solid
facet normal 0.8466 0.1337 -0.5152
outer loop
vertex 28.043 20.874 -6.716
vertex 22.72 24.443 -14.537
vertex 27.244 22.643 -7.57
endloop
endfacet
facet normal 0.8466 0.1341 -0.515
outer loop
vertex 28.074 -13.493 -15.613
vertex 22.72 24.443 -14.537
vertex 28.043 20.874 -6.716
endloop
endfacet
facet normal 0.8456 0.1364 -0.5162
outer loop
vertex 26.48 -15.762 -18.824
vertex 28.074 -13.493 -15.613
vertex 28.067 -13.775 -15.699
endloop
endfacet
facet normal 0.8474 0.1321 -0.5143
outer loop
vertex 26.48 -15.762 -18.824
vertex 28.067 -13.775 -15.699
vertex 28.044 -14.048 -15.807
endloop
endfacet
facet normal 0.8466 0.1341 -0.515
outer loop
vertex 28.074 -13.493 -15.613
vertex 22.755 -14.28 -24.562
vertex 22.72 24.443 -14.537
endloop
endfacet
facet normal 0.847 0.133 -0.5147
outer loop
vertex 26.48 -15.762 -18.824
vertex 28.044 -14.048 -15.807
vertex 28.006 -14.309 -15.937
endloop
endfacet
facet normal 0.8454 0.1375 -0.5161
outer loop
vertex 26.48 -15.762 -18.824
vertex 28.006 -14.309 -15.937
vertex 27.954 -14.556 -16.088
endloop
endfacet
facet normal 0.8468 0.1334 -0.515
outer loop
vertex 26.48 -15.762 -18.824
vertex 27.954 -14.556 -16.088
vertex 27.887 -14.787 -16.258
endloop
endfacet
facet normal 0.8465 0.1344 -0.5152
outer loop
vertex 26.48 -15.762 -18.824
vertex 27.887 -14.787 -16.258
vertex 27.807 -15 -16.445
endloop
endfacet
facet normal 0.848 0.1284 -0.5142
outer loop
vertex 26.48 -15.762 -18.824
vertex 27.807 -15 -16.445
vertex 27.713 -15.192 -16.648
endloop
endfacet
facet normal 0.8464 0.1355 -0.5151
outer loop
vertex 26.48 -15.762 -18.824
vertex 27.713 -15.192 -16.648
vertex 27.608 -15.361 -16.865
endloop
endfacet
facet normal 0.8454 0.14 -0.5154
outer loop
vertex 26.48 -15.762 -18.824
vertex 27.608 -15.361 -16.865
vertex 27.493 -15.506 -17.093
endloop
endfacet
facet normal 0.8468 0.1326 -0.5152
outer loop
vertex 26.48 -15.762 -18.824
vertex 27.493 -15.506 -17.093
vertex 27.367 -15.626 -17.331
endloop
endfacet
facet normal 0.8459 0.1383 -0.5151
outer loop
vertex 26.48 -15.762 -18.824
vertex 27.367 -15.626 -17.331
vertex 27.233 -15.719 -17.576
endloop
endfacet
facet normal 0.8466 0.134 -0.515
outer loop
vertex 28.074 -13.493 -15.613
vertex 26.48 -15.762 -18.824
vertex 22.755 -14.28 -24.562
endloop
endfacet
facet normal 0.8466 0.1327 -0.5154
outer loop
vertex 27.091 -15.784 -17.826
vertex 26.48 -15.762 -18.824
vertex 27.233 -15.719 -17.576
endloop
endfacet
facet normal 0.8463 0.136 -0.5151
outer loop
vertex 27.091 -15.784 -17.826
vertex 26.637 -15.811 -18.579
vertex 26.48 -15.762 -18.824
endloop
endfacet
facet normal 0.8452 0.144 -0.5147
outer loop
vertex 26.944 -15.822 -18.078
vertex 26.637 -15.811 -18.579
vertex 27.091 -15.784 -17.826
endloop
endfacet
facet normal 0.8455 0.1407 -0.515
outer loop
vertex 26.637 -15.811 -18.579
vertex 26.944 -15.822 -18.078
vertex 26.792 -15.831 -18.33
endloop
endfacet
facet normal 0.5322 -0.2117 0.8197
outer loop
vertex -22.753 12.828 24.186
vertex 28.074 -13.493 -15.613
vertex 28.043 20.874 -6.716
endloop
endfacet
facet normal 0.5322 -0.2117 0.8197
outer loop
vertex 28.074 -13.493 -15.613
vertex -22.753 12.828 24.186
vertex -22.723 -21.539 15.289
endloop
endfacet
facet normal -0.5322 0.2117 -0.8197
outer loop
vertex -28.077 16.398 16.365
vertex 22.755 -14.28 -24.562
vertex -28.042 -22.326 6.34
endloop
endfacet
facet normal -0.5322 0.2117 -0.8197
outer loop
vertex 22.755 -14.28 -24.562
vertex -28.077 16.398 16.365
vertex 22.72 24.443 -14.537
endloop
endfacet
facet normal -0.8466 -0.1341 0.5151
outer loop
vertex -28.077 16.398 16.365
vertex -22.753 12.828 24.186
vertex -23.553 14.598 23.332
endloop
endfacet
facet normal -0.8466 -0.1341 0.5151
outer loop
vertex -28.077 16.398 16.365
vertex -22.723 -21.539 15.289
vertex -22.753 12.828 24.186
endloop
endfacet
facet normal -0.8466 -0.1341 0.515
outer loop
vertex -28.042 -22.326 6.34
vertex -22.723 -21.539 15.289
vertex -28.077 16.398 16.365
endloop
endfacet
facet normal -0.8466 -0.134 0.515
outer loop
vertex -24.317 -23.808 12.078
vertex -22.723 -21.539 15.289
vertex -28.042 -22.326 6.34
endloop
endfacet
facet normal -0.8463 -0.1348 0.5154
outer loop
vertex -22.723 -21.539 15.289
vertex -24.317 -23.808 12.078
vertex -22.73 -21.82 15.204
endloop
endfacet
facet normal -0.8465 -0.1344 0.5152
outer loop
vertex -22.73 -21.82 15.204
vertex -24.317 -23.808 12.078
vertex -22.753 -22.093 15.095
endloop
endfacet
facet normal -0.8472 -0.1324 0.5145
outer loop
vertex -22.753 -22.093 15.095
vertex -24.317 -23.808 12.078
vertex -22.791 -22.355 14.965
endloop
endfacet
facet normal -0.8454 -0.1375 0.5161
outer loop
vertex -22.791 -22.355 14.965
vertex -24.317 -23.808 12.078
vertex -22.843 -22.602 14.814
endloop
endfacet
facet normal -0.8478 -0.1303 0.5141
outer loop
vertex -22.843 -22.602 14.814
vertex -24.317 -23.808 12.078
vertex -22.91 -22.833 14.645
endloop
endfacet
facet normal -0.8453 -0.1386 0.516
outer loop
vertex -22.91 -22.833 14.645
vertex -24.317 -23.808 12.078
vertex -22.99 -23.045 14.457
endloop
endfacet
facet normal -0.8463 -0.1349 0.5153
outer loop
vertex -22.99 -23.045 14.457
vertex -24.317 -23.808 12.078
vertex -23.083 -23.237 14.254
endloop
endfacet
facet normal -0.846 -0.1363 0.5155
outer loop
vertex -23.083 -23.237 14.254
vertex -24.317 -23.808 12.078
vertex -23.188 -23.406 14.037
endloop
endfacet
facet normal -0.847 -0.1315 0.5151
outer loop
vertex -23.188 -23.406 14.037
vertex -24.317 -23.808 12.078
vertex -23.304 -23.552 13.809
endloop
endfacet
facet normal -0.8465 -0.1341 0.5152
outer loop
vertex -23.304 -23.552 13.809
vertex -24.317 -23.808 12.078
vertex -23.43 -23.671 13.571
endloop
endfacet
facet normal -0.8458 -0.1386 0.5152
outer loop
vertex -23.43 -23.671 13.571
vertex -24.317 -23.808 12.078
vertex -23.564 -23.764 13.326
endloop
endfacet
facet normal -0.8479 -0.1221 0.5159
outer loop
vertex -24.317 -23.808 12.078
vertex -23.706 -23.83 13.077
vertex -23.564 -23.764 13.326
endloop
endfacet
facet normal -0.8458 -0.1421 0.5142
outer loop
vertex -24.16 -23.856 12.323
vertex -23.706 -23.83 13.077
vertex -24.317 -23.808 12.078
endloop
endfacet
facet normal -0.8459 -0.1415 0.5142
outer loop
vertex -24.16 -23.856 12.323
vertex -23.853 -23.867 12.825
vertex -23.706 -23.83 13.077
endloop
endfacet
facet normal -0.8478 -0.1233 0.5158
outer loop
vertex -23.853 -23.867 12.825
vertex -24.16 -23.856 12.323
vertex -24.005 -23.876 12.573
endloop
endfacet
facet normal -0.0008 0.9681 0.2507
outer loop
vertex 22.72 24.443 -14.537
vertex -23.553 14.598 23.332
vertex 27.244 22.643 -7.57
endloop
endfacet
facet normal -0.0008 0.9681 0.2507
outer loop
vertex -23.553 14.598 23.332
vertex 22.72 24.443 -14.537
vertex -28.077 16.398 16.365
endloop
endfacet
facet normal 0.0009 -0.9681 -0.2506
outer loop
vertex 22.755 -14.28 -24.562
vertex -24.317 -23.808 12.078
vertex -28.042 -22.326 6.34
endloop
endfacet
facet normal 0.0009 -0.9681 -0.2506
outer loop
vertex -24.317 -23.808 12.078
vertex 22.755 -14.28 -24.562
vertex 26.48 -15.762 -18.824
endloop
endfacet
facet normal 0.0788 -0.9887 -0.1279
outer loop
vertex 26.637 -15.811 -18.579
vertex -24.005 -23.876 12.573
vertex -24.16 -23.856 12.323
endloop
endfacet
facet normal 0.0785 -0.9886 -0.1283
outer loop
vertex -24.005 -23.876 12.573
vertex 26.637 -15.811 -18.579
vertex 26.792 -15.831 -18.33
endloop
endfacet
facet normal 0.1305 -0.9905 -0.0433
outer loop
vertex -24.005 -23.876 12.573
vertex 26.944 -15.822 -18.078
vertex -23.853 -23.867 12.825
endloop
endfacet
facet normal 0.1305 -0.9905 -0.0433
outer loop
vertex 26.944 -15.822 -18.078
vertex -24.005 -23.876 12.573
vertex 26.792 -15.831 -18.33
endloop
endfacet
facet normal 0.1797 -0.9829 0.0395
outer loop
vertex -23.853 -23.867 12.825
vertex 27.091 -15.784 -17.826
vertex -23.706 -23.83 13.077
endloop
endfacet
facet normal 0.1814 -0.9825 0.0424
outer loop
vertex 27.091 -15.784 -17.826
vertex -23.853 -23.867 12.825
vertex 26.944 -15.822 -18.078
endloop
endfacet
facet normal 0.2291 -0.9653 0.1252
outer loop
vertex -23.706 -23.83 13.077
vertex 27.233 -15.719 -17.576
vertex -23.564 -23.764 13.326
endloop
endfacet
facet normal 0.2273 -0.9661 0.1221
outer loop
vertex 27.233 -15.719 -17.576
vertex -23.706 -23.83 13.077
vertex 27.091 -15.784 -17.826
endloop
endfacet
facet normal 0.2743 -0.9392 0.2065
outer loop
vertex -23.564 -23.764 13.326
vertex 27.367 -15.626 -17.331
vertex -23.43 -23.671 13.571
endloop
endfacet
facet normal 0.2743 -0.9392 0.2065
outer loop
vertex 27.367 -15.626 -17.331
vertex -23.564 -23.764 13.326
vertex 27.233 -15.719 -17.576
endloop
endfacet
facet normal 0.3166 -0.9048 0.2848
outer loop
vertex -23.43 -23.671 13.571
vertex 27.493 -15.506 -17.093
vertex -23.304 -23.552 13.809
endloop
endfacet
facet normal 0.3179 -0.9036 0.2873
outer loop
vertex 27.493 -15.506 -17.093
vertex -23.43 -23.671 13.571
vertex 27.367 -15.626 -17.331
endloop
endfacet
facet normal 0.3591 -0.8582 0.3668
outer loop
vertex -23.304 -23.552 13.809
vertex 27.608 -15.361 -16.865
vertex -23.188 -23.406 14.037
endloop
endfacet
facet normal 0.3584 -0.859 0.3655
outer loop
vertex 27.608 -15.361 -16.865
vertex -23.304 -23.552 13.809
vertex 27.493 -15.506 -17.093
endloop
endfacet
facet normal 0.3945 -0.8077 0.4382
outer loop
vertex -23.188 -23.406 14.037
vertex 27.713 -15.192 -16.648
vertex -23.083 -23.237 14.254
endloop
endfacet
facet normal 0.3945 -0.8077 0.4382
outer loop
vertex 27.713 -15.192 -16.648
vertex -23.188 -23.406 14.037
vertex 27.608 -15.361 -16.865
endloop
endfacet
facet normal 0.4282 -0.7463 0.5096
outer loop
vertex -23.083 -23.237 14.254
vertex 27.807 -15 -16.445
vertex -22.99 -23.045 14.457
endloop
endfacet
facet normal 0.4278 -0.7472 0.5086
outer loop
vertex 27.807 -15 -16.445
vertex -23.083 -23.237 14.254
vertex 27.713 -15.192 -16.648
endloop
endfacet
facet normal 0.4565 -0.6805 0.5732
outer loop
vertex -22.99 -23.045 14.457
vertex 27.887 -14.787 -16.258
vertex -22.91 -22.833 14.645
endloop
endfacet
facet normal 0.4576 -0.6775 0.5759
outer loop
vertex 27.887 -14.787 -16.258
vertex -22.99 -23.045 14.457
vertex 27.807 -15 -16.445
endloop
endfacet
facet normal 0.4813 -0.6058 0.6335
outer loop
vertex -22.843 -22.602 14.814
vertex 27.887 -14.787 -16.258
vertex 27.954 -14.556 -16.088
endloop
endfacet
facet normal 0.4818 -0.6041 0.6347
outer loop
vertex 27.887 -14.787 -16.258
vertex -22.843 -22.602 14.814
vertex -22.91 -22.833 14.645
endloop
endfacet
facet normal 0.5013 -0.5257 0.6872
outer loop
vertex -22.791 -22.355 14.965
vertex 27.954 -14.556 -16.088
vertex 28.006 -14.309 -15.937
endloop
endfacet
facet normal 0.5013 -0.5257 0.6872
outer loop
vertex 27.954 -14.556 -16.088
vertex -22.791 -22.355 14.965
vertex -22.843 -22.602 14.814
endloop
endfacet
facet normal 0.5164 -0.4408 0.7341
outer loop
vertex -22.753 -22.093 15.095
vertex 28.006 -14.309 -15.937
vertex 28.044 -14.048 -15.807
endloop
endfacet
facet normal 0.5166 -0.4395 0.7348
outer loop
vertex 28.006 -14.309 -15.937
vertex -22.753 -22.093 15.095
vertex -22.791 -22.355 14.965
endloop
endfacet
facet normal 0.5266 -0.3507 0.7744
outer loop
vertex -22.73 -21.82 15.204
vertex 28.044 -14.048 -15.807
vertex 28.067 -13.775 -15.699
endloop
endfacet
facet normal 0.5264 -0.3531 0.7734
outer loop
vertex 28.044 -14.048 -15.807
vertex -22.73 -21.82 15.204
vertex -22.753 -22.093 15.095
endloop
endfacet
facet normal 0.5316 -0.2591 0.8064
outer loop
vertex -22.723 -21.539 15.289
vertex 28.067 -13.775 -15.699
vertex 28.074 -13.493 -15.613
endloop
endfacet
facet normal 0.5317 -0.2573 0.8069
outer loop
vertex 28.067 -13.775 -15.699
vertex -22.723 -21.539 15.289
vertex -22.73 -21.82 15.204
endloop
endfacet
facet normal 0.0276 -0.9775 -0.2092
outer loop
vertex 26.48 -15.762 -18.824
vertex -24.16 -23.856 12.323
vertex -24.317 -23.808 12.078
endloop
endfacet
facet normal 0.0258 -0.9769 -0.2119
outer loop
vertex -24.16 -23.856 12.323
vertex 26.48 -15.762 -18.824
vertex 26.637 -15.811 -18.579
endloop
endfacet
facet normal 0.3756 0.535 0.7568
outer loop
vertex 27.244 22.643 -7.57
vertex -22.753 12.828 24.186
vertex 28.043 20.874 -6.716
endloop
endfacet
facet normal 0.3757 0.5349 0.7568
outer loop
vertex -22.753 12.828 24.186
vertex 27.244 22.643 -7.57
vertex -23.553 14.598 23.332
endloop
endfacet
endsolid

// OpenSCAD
// file: edge_round_block.scad
// R3 is a spatial convex round along X, not an XY profile corner.
$fn = 64;
body_length = 60;
body_width = 40;
body_height = 10;
edge_round_1_radius = 3;
chamfer_1_width = 1.5;

module edge_round_block(body_length=60, body_width=40, body_height=10,
                        edge_round_1_radius=3, chamfer_1_width=1.5) {
    r = edge_round_1_radius;
    w = chamfer_1_width;
    assert(min(body_length,body_width,body_height,r,w)>0);
    assert(max(r,w)<body_height && r+w<body_width);
    module along_x() {
        multmatrix([[0,0,1,-1],[1,0,0,0],[0,1,0,0],[0,0,0,1]])
            linear_extrude(height=body_length+2) children();
    }
    difference() {
        cube([body_length,body_width,body_height]);
        along_x() difference() {
            translate([0,body_height-r]) square([r,r]);
            translate([r,body_height-r]) circle(r=r);
        }
        along_x() polygon([[body_width,body_height],
            [body_width-w,body_height],[body_width,body_height-w]]);
    }
}

edge_round_block(body_length,body_width,body_height,edge_round_1_radius,chamfer_1_width);
// main file
use <edge_round_block.scad>
$fn = 64;
body_length = 60;
body_width = 40;
body_height = 10;
edge_round_1_radius = 3;
chamfer_1_width = 1.5;

rotate([17,31,9]) translate([-body_length/2,-body_width/2,-body_height/2])
    edge_round_block(body_length,body_width,body_height,edge_round_1_radius,chamfer_1_width);
